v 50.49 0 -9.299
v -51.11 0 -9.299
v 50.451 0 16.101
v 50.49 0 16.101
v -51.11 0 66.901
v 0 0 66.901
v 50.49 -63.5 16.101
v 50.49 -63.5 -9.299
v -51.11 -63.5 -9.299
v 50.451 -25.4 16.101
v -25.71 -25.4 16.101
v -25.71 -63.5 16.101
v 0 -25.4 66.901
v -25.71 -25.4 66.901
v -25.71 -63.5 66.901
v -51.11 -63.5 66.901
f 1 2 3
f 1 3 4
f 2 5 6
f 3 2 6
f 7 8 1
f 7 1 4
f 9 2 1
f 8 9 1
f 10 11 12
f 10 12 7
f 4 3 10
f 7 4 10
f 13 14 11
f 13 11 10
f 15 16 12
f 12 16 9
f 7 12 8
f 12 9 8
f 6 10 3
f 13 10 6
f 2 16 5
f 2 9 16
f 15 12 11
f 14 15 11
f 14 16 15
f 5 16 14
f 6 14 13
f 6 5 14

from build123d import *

# Parameters (mm, degrees)
F0_W     = 101.6
F0_H     = 25.4
F1_DEPTH = 63.5
F2_W     = 25.4
F2_H     = 63.5
F3_DEPTH = 50.8
F4_W     = 25.709516
F4_H     = 25.4
F5_DEPTH = 50.8
F7_DEPTH = 25.4


with BuildPart() as f1:
    # F0 (on Front) → F1 (new body)
    with BuildSketch(Plane.XZ):
        with Locations((-0.309516, 3.400826)):
            Rectangle(F0_W, F0_H)
    extrude(amount=F1_DEPTH)

    # F2 (on face) → F3 (join)
    with BuildSketch(Plane.XY.offset(16.100826)):
        with Locations((-38.409516, -31.75)):
            Rectangle(F2_W, F2_H)
    extrude(amount=F3_DEPTH)

    # F4 (on face) → F5 (join)
    with BuildSketch(Plane.XY.offset(16.100826)):
        with Locations((-12.854758, -12.7)):
            Rectangle(F4_W, F4_H)
    extrude(amount=F5_DEPTH)

    # F6 (on face) → F7 (join)
    with BuildSketch(Plane.XZ.offset(25.4)):
        Polygon((50.451178, 16.100826), (0, 66.900826), (0, 16.100826), align=None)
    extrude(amount=-F7_DEPTH)


solid = f1.part
